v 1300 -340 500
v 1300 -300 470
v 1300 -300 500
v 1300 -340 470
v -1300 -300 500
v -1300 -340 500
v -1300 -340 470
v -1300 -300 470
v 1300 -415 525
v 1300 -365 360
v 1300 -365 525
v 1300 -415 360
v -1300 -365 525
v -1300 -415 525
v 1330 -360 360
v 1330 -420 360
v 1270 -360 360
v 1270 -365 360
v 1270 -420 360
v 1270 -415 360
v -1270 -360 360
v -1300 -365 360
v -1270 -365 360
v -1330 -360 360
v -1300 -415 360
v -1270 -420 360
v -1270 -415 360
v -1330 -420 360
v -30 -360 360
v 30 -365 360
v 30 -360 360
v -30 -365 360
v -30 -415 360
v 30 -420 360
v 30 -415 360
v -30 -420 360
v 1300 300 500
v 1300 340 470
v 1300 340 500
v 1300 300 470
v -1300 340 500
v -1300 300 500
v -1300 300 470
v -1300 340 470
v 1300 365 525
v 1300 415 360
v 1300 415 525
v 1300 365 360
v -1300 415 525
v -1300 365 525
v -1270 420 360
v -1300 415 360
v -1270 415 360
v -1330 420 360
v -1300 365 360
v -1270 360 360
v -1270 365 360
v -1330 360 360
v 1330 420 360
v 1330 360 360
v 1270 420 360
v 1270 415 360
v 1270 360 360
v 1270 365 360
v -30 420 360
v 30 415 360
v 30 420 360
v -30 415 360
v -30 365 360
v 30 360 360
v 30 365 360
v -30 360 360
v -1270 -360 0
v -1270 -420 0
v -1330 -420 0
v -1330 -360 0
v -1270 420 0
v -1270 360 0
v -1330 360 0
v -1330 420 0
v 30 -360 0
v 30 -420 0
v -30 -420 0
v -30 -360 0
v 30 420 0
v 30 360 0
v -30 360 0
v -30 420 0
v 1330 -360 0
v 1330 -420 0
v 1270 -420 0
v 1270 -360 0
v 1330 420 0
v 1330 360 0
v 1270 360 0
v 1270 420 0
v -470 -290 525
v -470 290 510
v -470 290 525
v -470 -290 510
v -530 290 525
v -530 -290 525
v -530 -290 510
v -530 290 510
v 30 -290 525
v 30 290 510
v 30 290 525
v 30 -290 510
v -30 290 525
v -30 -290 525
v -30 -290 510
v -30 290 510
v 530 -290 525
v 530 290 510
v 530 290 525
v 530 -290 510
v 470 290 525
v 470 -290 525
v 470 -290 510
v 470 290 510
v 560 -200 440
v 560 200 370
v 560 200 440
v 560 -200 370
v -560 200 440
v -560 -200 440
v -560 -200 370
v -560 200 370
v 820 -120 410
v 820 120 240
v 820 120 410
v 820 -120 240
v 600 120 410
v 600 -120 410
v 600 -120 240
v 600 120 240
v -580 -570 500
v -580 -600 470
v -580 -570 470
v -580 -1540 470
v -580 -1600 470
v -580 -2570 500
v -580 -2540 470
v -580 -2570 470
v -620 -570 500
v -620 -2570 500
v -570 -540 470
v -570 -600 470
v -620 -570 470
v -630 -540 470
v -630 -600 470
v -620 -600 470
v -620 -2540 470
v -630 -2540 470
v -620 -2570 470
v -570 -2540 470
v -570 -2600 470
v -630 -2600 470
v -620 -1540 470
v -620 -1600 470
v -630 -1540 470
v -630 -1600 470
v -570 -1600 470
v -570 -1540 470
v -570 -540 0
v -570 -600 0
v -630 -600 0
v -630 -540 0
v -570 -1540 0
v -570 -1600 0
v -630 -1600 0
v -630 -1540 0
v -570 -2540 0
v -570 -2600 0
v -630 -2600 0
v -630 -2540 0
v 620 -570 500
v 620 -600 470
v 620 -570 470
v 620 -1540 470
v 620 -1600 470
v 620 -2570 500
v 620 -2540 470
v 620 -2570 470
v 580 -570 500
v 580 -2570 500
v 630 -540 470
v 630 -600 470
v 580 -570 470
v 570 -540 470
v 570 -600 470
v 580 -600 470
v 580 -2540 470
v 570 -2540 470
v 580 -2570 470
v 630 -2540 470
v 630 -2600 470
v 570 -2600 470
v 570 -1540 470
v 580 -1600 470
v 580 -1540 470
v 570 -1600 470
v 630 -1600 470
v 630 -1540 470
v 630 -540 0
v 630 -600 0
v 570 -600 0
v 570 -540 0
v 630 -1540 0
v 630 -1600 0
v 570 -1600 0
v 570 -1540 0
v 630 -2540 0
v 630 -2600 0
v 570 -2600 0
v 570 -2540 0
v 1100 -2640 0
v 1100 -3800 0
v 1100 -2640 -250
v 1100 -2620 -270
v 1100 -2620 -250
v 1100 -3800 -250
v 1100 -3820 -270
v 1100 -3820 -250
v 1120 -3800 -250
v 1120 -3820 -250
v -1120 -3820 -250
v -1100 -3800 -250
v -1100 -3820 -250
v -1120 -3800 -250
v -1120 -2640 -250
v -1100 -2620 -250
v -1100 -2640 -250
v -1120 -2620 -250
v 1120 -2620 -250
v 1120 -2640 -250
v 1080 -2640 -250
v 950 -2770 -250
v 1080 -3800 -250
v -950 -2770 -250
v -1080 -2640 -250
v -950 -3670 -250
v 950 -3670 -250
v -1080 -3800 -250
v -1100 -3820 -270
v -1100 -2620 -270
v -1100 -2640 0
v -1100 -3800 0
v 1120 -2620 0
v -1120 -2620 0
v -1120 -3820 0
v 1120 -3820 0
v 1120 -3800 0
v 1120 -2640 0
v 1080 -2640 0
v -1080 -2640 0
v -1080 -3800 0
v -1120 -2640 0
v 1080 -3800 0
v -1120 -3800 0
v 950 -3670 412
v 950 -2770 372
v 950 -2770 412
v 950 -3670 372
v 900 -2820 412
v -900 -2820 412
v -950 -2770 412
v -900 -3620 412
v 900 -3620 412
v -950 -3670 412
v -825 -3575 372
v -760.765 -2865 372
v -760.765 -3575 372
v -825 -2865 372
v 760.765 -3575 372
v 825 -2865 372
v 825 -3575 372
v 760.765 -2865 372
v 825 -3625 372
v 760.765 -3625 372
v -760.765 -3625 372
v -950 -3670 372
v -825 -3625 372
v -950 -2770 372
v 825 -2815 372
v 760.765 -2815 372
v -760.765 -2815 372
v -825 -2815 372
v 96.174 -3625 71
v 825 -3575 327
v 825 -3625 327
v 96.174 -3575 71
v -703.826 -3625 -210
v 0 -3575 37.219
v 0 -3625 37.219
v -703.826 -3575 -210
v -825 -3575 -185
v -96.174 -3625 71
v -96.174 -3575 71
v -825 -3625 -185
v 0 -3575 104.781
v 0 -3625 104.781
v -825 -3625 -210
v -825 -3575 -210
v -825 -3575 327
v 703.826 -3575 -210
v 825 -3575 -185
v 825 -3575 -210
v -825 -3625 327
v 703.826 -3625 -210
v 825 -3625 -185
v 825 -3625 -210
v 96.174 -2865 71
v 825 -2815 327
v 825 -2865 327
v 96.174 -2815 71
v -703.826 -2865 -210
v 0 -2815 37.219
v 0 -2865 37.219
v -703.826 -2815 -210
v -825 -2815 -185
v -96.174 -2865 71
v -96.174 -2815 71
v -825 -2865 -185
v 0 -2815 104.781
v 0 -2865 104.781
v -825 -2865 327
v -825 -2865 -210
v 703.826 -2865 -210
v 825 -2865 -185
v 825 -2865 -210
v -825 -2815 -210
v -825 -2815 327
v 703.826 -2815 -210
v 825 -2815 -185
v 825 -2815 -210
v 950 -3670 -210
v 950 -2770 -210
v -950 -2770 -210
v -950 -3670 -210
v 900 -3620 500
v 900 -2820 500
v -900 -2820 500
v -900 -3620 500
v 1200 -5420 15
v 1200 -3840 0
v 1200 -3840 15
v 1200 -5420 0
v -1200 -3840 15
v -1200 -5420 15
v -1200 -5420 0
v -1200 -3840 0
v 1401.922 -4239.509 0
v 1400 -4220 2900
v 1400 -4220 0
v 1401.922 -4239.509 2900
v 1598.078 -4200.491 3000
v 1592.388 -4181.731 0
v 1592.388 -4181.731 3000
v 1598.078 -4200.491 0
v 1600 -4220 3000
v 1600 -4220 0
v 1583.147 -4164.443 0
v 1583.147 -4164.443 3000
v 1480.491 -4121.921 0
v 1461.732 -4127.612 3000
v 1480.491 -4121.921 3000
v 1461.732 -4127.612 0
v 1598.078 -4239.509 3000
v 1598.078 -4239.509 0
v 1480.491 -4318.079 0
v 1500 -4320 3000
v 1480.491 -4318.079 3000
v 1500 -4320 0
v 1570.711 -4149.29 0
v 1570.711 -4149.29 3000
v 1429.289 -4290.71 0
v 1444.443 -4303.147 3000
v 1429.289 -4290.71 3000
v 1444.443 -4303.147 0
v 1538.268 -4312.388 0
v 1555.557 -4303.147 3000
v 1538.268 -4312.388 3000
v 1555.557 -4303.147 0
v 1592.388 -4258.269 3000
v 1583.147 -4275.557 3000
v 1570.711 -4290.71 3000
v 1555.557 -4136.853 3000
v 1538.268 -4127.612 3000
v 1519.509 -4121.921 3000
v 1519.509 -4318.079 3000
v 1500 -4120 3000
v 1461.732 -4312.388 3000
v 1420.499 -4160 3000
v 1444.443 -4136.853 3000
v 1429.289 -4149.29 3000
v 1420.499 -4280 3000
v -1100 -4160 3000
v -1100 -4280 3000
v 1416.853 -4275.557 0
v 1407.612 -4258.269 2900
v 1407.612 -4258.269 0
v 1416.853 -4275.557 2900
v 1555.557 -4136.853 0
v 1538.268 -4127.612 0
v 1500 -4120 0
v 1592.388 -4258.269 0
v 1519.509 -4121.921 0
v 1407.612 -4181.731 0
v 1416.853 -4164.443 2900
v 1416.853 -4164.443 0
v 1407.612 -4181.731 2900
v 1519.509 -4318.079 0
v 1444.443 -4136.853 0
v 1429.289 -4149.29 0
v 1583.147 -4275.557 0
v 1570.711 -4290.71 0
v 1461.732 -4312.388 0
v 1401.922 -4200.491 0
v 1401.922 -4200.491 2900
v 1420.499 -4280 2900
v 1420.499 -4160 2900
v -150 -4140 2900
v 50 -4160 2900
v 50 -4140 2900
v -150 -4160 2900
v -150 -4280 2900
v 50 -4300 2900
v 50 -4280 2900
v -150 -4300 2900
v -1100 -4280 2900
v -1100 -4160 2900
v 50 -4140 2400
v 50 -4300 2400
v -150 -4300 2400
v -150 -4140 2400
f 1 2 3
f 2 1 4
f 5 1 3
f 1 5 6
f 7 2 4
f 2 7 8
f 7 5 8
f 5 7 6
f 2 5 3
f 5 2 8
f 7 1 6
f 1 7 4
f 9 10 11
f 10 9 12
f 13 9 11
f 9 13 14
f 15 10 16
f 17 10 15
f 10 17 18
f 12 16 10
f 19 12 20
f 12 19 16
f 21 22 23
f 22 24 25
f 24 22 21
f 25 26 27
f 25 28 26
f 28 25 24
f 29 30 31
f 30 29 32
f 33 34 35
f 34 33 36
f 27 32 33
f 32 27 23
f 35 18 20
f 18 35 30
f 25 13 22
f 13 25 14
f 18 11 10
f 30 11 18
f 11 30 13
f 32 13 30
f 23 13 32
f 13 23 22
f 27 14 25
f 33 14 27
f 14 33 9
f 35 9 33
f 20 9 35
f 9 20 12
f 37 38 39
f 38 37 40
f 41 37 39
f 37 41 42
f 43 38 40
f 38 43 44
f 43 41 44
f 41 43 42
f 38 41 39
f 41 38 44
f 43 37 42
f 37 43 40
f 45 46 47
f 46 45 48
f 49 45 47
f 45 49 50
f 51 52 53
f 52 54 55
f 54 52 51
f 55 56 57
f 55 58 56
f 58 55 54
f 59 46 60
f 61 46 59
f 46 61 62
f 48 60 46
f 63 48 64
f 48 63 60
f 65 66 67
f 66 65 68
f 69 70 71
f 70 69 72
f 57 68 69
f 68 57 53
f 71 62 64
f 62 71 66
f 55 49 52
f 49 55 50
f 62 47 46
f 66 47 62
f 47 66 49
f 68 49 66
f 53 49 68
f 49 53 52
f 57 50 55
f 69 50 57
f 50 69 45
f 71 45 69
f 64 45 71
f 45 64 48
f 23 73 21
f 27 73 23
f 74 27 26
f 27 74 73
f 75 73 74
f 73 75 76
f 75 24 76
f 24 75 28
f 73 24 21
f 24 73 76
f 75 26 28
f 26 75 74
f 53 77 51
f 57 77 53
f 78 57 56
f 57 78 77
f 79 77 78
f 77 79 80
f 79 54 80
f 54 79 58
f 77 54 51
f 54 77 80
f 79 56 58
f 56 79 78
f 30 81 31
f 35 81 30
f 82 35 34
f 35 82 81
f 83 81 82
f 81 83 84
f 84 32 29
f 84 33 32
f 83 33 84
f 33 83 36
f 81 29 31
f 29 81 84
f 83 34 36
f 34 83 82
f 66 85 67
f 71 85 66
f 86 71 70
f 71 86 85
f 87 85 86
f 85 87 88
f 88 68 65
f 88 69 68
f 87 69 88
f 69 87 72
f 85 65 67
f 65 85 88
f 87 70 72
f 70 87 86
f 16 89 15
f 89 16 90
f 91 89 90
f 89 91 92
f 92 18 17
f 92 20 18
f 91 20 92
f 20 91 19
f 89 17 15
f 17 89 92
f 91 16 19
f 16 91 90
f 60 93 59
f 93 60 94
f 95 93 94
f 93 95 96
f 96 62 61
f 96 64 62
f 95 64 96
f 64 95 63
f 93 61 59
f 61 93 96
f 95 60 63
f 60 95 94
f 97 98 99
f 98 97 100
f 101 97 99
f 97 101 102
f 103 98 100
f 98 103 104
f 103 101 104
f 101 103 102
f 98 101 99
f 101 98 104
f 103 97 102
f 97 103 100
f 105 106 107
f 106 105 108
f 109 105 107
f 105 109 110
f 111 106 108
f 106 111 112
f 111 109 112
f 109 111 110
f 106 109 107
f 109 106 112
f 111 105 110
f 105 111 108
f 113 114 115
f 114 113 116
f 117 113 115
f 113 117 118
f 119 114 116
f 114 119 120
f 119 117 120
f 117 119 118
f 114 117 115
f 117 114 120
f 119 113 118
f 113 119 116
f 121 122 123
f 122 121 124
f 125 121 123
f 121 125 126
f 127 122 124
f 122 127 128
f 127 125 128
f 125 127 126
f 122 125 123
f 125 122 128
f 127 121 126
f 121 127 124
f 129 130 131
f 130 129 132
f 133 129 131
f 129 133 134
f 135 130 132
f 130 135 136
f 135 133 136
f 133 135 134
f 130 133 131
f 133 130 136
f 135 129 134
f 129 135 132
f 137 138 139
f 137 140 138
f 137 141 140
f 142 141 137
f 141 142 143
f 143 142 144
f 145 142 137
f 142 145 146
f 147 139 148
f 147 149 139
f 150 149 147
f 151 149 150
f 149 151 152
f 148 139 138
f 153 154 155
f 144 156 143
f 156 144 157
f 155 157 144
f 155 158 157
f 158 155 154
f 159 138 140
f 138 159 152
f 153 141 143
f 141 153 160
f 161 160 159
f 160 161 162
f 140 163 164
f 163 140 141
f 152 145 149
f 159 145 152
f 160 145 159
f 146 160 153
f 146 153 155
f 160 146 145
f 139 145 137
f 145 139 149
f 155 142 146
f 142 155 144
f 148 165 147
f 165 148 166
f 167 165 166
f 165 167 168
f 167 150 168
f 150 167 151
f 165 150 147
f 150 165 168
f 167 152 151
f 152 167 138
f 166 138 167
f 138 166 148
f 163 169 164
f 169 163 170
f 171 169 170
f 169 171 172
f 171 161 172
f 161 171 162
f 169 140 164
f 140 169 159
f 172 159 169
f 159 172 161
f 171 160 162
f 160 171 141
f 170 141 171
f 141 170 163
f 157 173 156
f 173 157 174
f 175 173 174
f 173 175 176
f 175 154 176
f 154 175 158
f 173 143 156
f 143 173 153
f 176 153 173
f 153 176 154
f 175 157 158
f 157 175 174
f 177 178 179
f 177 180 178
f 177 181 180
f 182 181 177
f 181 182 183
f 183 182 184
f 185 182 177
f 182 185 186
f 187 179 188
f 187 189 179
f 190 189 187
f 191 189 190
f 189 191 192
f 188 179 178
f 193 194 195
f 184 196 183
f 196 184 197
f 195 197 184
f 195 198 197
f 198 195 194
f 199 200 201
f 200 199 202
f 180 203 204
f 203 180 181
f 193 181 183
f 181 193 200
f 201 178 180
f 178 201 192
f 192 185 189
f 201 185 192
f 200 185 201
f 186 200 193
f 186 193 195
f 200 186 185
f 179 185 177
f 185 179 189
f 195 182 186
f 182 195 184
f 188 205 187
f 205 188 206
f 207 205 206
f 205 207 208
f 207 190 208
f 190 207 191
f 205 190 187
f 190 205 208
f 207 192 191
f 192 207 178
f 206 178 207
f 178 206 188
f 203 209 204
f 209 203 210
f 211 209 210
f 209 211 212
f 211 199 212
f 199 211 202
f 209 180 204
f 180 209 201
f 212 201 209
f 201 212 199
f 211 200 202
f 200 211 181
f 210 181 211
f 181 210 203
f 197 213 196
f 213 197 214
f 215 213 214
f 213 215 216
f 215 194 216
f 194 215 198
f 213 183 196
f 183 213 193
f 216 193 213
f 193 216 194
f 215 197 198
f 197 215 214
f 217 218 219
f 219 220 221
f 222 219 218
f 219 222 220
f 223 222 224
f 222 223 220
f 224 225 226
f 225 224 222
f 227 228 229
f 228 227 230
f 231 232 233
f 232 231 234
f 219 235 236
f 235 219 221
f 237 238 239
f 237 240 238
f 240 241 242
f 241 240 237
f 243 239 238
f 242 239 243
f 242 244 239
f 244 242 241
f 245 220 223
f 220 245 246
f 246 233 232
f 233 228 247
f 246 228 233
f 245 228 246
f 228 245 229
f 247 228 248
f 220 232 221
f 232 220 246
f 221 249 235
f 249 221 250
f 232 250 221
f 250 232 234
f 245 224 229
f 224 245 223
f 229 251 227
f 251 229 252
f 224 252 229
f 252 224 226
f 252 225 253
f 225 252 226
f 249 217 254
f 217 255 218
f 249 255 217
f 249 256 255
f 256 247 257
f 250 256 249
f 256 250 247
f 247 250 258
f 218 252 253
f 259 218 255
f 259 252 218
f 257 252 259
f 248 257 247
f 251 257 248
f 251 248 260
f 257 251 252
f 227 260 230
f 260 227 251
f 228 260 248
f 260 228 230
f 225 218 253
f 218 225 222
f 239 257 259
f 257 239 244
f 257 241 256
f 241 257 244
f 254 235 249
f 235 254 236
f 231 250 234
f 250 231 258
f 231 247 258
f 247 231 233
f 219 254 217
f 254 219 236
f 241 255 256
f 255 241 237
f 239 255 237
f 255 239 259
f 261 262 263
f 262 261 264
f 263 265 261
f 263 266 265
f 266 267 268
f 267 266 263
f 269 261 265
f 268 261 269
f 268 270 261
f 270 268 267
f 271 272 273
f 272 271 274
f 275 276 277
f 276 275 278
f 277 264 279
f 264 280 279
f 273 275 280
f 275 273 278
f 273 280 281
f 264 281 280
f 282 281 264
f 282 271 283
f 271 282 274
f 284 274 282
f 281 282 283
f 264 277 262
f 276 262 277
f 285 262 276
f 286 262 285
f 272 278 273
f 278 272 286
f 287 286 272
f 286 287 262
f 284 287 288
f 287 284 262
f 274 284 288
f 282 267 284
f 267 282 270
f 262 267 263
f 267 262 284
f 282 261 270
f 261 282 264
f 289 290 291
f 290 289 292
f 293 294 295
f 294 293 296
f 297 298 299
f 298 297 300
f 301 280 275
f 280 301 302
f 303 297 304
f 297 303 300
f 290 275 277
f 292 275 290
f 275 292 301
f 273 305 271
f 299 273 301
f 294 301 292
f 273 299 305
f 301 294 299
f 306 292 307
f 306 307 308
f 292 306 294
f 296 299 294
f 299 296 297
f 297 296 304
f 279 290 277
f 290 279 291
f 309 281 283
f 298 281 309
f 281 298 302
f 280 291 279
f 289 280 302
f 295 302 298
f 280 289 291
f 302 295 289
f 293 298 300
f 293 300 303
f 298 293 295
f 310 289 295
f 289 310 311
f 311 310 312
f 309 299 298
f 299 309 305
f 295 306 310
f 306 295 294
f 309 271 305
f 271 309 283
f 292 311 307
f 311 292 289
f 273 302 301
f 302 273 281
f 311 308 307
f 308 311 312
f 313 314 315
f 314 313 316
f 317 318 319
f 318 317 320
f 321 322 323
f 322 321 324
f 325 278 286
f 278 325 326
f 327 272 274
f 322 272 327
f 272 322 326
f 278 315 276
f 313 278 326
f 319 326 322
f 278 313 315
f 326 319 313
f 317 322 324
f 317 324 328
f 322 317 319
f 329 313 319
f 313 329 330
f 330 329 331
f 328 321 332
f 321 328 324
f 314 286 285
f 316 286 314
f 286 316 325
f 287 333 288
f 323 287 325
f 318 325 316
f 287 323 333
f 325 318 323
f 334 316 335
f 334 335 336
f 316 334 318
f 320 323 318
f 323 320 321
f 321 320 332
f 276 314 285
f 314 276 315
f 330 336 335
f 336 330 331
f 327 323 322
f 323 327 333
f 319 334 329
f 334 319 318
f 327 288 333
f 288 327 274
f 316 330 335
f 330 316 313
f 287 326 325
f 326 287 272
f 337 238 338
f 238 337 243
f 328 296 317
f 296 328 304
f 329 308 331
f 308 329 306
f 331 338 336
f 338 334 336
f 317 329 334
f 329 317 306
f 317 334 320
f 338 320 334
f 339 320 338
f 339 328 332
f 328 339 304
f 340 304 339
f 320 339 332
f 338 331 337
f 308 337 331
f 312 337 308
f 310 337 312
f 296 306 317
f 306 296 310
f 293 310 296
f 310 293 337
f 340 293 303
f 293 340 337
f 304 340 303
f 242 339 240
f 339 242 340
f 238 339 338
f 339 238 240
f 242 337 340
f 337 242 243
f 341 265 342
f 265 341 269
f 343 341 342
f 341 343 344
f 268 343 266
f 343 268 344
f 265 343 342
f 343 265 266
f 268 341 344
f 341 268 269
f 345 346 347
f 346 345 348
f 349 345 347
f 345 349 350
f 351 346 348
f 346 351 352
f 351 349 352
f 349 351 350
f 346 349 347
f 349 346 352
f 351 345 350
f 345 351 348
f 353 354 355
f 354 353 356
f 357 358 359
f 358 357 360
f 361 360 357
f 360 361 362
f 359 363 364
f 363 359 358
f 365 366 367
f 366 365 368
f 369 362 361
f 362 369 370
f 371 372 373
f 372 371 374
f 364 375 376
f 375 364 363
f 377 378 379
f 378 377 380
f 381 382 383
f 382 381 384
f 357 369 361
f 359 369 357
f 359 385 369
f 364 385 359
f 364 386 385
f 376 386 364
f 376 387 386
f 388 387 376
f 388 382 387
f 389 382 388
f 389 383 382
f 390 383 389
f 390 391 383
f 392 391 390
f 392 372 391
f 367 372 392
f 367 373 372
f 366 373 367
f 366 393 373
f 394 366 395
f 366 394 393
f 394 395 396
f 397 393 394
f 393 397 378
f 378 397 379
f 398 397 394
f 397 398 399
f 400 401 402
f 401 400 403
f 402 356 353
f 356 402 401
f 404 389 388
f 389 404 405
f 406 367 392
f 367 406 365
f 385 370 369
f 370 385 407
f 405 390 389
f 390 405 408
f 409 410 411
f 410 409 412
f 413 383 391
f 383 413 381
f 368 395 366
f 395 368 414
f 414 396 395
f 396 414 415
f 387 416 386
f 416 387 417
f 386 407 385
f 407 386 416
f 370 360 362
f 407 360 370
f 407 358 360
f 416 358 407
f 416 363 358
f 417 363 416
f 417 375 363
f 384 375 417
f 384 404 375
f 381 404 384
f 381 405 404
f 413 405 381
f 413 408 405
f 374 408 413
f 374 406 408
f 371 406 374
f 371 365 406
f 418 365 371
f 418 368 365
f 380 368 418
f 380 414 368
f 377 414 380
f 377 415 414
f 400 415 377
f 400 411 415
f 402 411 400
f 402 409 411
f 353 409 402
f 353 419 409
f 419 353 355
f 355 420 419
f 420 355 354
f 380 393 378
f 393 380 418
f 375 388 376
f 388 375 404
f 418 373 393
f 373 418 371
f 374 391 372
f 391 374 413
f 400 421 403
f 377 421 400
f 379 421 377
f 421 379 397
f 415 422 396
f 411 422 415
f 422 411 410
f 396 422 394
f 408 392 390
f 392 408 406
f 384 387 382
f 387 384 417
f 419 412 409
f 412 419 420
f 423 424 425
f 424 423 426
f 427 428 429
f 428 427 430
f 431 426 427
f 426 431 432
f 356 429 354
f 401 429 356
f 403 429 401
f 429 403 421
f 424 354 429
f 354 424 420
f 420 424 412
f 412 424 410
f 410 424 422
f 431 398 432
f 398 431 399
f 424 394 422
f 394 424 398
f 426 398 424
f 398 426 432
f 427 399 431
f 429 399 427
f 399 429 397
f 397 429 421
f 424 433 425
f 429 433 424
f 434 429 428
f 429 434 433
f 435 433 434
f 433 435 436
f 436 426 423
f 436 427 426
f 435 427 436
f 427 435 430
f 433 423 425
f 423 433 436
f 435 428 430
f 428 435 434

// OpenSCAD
// assy_spur - generated by asm_3d.py from out/assembly/assembly_specs.json (F4.4) - units mm
// DESIGN - check and release before manufacture. z up, conveyor top z = 500.

module assy_spur() {
  translate([-1300.00, -340.00, 470.00]) cube([2600.00, 40.00, 30.00]);
  translate([-1300.00, -415.00, 360.00]) cube([2600.00, 50.00, 165.00]);
  translate([-1300.00, 300.00, 470.00]) cube([2600.00, 40.00, 30.00]);
  translate([-1300.00, 365.00, 360.00]) cube([2600.00, 50.00, 165.00]);
  translate([-1330.00, -420.00, 0.00]) cube([60.00, 60.00, 360.00]);
  translate([-1330.00, 360.00, 0.00]) cube([60.00, 60.00, 360.00]);
  translate([-30.00, -420.00, 0.00]) cube([60.00, 60.00, 360.00]);
  translate([-30.00, 360.00, 0.00]) cube([60.00, 60.00, 360.00]);
  translate([1270.00, -420.00, 0.00]) cube([60.00, 60.00, 360.00]);
  translate([1270.00, 360.00, 0.00]) cube([60.00, 60.00, 360.00]);
  translate([-530.00, -290.00, 510.00]) cube([60.00, 580.00, 15.00]);
  translate([-30.00, -290.00, 510.00]) cube([60.00, 580.00, 15.00]);
  translate([470.00, -290.00, 510.00]) cube([60.00, 580.00, 15.00]);
  translate([-560.00, -200.00, 370.00]) cube([1120.00, 400.00, 70.00]);
  translate([600.00, -120.00, 240.00]) cube([220.00, 240.00, 170.00]);
  translate([-620.00, -2570.00, 470.00]) cube([40.00, 2000.00, 30.00]);
  translate([-630.00, -600.00, 0.00]) cube([60.00, 60.00, 470.00]);
  translate([-630.00, -1600.00, 0.00]) cube([60.00, 60.00, 470.00]);
  translate([-630.00, -2600.00, 0.00]) cube([60.00, 60.00, 470.00]);
  translate([580.00, -2570.00, 470.00]) cube([40.00, 2000.00, 30.00]);
  translate([570.00, -600.00, 0.00]) cube([60.00, 60.00, 470.00]);
  translate([570.00, -1600.00, 0.00]) cube([60.00, 60.00, 470.00]);
  translate([570.00, -2600.00, 0.00]) cube([60.00, 60.00, 470.00]);
  translate([-1100.00, -3820.00, -270.00]) cube([2200.00, 1200.00, 20.00]);
  translate([-1120.00, -3820.00, -250.00]) cube([2240.00, 20.00, 250.00]);
  translate([-1100.00, -3820.00, -250.00]) cube([20.00, 1200.00, 250.00]);
  translate([-1120.00, -2640.00, -250.00]) cube([2240.00, 20.00, 250.00]);
  translate([1080.00, -3820.00, -250.00]) cube([20.00, 1200.00, 250.00]);
  translate([-950.00, -3670.00, 372.00]) cube([1900.00, 900.00, 40.00]);
  hull() { translate([-800.00, -3600.00, -210.00]) cube([50.00, 50.00, 50.00], center = true); translate([800.00, -3600.00, 352.00]) cube([50.00, 50.00, 50.00], center = true); }
  hull() { translate([800.00, -3600.00, -210.00]) cube([50.00, 50.00, 50.00], center = true); translate([-800.00, -3600.00, 352.00]) cube([50.00, 50.00, 50.00], center = true); }
  hull() { translate([-800.00, -2840.00, -210.00]) cube([50.00, 50.00, 50.00], center = true); translate([800.00, -2840.00, 352.00]) cube([50.00, 50.00, 50.00], center = true); }
  hull() { translate([800.00, -2840.00, -210.00]) cube([50.00, 50.00, 50.00], center = true); translate([-800.00, -2840.00, 352.00]) cube([50.00, 50.00, 50.00], center = true); }
  translate([-950.00, -3670.00, -250.00]) cube([1900.00, 900.00, 40.00]);
  translate([-700.00, -3220.00, 432.00]) rotate([0, 0, 0]) cylinder(r = 15.00, h = 40.00, center = true, $fn = 32);
  translate([700.00, -3220.00, 432.00]) rotate([0, 0, 0]) cylinder(r = 15.00, h = 40.00, center = true, $fn = 32);
  translate([-900.00, -3620.00, 412.00]) cube([1800.00, 800.00, 88.00]);
  translate([-1200.00, -5420.00, 0.00]) cube([2400.00, 1580.00, 15.00]);
  translate([1500.00, -4220.00, 1500.00]) rotate([0, 0, 0]) cylinder(r = 100.00, h = 3000.00, center = true, $fn = 32);
  translate([-1100.00, -4280.00, 2900.00]) cube([2600.00, 120.00, 100.00]);
  translate([-150.00, -4300.00, 2400.00]) cube([200.00, 160.00, 500.00]);
}
assy_spur();
